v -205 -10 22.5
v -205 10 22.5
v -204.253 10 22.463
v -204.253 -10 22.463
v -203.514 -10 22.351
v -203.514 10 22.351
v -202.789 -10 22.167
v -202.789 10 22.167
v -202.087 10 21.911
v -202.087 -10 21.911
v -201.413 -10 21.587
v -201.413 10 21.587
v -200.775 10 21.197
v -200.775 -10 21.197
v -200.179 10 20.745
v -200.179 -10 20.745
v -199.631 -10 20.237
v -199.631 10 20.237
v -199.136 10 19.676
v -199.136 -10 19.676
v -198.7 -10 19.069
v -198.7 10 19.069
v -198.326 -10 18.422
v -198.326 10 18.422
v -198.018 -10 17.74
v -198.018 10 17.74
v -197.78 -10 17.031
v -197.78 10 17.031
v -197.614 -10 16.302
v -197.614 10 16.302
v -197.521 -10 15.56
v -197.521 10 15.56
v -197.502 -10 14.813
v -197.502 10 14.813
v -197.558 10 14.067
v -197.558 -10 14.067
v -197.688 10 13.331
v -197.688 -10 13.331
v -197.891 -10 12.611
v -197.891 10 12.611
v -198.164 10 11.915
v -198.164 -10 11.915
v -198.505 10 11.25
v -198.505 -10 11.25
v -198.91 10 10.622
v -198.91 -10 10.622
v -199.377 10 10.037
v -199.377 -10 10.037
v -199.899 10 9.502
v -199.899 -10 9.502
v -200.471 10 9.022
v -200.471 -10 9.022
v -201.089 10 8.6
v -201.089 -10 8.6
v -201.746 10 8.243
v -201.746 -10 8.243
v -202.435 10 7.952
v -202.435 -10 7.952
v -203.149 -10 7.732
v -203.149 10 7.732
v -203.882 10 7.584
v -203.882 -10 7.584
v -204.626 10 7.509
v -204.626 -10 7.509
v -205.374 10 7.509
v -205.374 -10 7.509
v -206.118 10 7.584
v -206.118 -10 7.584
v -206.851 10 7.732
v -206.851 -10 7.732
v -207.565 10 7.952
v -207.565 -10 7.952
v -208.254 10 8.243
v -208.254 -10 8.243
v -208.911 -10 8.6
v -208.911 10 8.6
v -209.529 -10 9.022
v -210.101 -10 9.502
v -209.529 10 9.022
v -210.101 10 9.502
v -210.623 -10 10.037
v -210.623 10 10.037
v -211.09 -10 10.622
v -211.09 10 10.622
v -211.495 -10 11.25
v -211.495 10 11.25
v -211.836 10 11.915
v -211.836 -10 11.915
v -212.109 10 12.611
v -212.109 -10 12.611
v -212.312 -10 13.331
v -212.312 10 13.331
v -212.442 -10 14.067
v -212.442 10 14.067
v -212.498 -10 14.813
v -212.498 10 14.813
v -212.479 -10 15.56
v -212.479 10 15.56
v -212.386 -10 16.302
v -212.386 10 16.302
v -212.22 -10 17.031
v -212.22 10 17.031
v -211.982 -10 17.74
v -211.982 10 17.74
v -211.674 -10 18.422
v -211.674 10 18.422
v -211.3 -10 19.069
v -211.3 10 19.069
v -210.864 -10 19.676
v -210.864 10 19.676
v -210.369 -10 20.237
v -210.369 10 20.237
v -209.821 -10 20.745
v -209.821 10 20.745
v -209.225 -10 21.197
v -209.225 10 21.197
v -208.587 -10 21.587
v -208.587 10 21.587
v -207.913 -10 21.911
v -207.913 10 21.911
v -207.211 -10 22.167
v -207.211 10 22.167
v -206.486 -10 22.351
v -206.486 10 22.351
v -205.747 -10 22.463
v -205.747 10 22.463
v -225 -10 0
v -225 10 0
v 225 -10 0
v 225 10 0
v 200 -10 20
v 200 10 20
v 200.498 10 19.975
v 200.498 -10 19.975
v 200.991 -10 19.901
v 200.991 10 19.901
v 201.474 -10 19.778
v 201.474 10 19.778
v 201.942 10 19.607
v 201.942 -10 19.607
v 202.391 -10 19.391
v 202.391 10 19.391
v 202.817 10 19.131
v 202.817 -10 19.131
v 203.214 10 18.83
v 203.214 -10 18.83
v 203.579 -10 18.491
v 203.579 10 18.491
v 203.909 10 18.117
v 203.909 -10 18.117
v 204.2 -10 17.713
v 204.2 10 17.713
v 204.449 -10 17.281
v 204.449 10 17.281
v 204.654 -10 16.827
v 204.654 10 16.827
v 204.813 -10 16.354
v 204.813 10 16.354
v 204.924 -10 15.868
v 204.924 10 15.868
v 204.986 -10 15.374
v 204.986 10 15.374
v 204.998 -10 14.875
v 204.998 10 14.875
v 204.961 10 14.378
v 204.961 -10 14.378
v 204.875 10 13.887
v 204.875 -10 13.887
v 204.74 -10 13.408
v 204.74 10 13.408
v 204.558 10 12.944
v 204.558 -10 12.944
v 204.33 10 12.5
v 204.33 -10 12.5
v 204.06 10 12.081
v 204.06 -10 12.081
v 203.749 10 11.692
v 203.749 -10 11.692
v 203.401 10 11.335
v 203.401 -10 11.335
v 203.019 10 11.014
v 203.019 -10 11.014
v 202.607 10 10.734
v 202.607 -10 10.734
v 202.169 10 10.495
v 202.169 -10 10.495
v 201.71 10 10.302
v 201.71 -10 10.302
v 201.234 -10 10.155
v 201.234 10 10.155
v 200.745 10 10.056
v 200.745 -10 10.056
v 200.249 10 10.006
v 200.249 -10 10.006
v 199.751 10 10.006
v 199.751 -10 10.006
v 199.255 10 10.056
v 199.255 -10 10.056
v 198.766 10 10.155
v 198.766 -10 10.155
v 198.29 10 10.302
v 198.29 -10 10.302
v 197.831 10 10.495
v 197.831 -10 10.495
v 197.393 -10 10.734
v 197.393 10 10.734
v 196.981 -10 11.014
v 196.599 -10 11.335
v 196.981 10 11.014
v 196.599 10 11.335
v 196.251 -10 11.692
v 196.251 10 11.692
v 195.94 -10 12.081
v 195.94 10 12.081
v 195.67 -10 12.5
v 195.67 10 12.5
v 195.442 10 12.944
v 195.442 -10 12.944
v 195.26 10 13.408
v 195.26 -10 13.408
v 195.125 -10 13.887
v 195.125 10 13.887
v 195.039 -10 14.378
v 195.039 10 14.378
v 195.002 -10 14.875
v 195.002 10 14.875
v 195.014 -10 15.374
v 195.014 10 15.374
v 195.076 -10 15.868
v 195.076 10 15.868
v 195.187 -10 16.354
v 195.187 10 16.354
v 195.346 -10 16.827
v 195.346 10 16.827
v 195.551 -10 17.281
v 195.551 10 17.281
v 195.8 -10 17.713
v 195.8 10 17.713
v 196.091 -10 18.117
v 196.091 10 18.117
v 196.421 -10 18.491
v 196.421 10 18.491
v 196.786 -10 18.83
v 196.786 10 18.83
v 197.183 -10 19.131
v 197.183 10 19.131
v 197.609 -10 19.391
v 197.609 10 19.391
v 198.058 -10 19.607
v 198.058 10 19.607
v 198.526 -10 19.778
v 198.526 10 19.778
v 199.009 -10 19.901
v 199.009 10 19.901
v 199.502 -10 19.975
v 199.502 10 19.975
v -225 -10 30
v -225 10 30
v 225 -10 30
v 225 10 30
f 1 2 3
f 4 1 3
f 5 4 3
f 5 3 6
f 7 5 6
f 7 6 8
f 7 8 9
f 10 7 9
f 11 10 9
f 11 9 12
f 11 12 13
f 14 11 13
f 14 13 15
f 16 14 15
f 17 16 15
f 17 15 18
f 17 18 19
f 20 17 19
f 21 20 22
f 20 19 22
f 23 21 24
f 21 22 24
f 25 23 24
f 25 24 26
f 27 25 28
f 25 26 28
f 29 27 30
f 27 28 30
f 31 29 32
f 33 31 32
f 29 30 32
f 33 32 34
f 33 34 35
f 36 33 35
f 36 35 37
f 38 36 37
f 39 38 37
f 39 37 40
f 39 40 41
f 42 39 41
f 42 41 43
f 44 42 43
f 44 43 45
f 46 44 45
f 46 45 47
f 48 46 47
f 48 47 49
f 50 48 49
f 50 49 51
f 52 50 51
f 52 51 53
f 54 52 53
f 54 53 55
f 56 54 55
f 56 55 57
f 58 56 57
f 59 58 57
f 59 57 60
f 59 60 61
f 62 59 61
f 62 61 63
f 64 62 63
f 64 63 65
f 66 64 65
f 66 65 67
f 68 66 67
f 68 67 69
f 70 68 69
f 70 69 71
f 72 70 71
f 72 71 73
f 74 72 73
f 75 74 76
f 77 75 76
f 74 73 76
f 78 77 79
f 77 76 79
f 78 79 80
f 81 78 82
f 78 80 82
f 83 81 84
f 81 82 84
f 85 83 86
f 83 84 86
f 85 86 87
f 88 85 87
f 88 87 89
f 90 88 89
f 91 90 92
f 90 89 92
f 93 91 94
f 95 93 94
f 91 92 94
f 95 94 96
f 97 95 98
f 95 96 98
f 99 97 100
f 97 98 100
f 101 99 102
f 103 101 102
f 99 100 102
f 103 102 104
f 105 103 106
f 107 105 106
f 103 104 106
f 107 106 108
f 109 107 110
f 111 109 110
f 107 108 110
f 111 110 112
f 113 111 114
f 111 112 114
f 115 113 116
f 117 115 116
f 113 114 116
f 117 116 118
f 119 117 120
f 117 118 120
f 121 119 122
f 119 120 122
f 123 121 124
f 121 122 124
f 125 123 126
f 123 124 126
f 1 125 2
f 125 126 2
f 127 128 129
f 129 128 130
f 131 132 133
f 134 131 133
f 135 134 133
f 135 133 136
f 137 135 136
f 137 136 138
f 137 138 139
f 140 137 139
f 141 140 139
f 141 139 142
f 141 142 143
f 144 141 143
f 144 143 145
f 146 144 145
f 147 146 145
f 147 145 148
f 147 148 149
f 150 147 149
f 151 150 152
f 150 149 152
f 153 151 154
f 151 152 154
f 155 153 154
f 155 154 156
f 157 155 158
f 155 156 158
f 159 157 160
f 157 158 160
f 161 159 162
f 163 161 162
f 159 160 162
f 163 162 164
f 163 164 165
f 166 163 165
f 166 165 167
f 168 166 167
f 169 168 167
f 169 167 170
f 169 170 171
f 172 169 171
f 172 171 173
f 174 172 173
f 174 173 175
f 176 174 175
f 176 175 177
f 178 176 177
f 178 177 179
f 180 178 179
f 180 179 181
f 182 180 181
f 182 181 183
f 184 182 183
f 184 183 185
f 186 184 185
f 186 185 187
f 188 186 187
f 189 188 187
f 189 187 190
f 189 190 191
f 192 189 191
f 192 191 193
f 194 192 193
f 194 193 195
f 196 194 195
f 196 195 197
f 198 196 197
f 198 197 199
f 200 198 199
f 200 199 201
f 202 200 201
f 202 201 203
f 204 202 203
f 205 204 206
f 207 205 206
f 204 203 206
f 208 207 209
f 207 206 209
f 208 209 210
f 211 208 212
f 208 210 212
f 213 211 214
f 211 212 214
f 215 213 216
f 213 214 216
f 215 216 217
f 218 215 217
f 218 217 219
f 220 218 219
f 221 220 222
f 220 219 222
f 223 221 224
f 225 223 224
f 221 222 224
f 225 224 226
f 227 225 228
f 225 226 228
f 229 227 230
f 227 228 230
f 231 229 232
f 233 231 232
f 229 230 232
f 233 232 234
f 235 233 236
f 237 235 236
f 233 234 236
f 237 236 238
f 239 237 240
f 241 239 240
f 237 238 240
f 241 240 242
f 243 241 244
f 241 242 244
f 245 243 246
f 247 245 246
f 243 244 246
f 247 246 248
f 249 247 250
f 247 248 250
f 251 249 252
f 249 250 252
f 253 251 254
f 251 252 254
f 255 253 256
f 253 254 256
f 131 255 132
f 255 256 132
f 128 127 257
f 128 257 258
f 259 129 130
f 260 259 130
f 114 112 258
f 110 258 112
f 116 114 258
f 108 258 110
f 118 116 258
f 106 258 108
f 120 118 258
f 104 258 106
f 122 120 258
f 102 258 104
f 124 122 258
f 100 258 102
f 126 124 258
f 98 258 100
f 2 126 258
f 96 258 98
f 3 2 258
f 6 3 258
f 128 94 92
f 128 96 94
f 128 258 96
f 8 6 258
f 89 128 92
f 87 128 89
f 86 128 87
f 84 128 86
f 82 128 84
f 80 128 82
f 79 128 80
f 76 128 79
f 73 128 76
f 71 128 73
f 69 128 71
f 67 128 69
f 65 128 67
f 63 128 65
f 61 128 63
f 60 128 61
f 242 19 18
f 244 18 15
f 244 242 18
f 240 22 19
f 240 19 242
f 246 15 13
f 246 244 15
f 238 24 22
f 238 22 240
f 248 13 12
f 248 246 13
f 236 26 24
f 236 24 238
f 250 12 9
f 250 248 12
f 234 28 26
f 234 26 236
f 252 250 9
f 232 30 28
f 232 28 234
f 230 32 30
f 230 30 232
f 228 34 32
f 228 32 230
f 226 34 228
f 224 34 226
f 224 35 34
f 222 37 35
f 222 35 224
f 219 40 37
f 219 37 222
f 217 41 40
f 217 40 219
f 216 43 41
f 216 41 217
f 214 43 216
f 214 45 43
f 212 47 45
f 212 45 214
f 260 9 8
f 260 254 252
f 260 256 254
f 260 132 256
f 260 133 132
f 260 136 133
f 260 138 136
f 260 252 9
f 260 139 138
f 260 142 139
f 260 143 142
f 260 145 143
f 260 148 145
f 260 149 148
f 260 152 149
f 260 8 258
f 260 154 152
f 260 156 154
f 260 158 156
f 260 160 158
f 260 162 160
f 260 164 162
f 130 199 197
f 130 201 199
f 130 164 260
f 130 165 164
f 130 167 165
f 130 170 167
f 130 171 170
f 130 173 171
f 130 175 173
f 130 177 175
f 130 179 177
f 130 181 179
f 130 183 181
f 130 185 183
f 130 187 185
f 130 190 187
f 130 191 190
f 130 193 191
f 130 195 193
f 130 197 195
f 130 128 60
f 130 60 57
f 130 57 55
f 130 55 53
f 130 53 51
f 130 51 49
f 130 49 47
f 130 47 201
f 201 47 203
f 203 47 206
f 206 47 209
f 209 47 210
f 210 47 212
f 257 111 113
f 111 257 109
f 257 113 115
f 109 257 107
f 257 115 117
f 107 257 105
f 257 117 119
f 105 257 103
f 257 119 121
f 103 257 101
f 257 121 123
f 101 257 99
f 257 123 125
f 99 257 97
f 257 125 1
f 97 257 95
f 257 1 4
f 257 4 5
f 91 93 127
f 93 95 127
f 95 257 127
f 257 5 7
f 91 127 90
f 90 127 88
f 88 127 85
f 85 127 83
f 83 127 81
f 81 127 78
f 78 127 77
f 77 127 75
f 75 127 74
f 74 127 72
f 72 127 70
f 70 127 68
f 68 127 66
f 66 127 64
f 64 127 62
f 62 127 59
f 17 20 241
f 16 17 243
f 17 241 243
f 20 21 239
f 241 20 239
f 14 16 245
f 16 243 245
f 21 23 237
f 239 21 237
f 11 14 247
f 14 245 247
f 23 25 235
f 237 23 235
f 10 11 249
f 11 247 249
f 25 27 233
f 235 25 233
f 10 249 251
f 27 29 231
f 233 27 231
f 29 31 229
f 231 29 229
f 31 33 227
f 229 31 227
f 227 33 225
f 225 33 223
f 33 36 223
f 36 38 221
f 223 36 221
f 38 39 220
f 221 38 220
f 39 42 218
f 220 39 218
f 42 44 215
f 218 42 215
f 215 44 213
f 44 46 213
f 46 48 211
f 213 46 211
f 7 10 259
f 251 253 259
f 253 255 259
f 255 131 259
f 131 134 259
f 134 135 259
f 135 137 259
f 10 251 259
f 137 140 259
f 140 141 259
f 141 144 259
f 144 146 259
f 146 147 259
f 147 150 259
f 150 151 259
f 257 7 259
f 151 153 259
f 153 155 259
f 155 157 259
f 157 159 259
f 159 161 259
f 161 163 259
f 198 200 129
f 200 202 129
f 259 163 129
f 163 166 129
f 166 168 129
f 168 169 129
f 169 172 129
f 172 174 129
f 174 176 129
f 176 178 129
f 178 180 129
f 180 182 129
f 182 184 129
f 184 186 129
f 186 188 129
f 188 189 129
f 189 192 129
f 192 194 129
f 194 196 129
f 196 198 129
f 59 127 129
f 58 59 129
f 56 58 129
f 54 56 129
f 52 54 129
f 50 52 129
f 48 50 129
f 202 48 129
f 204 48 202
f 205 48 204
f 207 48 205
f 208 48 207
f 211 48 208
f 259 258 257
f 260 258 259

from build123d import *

# Parameters (mm, degrees)
SKETCH_1_W          = 450
SKETCH_1_H          = 20
EXTRUDE_1_DEPTH     = 30
SKETCH_2_R          = 7.5
CUT_EXTRUDE_1_DEPTH = 30
SKETCH_3_R          = 5
CUT_EXTRUDE_2_DEPTH = 228.870577302


with BuildPart() as part:
    # 草图1 → 凸台-拉伸1 (new body)
    with BuildSketch(Plane.XY):
        Rectangle(SKETCH_1_W, SKETCH_1_H)
    extrude(amount=EXTRUDE_1_DEPTH)

    # 草图2 → 切除-拉伸1 (cut)
    with BuildSketch(Plane(origin=(0, 10, 0), x_dir=(1, 0, 0), z_dir=(0, 1, 0))):
        with Locations(Location((-205, -15, 0), (0, 0, 270))):
            Circle(SKETCH_2_R)
    extrude(amount=-CUT_EXTRUDE_1_DEPTH, mode=Mode.SUBTRACT)

    # 草图3 → 切除-拉伸2 (cut, through all)
    with BuildSketch(Plane(origin=(0, 10, 0), x_dir=(1, 0, 0), z_dir=(0, 1, 0))):
        with Locations(Location((200, -15, 0), (0, 0, 270))):
            Circle(SKETCH_3_R)
    extrude(amount=-CUT_EXTRUDE_2_DEPTH, mode=Mode.SUBTRACT)


solid = part.part
